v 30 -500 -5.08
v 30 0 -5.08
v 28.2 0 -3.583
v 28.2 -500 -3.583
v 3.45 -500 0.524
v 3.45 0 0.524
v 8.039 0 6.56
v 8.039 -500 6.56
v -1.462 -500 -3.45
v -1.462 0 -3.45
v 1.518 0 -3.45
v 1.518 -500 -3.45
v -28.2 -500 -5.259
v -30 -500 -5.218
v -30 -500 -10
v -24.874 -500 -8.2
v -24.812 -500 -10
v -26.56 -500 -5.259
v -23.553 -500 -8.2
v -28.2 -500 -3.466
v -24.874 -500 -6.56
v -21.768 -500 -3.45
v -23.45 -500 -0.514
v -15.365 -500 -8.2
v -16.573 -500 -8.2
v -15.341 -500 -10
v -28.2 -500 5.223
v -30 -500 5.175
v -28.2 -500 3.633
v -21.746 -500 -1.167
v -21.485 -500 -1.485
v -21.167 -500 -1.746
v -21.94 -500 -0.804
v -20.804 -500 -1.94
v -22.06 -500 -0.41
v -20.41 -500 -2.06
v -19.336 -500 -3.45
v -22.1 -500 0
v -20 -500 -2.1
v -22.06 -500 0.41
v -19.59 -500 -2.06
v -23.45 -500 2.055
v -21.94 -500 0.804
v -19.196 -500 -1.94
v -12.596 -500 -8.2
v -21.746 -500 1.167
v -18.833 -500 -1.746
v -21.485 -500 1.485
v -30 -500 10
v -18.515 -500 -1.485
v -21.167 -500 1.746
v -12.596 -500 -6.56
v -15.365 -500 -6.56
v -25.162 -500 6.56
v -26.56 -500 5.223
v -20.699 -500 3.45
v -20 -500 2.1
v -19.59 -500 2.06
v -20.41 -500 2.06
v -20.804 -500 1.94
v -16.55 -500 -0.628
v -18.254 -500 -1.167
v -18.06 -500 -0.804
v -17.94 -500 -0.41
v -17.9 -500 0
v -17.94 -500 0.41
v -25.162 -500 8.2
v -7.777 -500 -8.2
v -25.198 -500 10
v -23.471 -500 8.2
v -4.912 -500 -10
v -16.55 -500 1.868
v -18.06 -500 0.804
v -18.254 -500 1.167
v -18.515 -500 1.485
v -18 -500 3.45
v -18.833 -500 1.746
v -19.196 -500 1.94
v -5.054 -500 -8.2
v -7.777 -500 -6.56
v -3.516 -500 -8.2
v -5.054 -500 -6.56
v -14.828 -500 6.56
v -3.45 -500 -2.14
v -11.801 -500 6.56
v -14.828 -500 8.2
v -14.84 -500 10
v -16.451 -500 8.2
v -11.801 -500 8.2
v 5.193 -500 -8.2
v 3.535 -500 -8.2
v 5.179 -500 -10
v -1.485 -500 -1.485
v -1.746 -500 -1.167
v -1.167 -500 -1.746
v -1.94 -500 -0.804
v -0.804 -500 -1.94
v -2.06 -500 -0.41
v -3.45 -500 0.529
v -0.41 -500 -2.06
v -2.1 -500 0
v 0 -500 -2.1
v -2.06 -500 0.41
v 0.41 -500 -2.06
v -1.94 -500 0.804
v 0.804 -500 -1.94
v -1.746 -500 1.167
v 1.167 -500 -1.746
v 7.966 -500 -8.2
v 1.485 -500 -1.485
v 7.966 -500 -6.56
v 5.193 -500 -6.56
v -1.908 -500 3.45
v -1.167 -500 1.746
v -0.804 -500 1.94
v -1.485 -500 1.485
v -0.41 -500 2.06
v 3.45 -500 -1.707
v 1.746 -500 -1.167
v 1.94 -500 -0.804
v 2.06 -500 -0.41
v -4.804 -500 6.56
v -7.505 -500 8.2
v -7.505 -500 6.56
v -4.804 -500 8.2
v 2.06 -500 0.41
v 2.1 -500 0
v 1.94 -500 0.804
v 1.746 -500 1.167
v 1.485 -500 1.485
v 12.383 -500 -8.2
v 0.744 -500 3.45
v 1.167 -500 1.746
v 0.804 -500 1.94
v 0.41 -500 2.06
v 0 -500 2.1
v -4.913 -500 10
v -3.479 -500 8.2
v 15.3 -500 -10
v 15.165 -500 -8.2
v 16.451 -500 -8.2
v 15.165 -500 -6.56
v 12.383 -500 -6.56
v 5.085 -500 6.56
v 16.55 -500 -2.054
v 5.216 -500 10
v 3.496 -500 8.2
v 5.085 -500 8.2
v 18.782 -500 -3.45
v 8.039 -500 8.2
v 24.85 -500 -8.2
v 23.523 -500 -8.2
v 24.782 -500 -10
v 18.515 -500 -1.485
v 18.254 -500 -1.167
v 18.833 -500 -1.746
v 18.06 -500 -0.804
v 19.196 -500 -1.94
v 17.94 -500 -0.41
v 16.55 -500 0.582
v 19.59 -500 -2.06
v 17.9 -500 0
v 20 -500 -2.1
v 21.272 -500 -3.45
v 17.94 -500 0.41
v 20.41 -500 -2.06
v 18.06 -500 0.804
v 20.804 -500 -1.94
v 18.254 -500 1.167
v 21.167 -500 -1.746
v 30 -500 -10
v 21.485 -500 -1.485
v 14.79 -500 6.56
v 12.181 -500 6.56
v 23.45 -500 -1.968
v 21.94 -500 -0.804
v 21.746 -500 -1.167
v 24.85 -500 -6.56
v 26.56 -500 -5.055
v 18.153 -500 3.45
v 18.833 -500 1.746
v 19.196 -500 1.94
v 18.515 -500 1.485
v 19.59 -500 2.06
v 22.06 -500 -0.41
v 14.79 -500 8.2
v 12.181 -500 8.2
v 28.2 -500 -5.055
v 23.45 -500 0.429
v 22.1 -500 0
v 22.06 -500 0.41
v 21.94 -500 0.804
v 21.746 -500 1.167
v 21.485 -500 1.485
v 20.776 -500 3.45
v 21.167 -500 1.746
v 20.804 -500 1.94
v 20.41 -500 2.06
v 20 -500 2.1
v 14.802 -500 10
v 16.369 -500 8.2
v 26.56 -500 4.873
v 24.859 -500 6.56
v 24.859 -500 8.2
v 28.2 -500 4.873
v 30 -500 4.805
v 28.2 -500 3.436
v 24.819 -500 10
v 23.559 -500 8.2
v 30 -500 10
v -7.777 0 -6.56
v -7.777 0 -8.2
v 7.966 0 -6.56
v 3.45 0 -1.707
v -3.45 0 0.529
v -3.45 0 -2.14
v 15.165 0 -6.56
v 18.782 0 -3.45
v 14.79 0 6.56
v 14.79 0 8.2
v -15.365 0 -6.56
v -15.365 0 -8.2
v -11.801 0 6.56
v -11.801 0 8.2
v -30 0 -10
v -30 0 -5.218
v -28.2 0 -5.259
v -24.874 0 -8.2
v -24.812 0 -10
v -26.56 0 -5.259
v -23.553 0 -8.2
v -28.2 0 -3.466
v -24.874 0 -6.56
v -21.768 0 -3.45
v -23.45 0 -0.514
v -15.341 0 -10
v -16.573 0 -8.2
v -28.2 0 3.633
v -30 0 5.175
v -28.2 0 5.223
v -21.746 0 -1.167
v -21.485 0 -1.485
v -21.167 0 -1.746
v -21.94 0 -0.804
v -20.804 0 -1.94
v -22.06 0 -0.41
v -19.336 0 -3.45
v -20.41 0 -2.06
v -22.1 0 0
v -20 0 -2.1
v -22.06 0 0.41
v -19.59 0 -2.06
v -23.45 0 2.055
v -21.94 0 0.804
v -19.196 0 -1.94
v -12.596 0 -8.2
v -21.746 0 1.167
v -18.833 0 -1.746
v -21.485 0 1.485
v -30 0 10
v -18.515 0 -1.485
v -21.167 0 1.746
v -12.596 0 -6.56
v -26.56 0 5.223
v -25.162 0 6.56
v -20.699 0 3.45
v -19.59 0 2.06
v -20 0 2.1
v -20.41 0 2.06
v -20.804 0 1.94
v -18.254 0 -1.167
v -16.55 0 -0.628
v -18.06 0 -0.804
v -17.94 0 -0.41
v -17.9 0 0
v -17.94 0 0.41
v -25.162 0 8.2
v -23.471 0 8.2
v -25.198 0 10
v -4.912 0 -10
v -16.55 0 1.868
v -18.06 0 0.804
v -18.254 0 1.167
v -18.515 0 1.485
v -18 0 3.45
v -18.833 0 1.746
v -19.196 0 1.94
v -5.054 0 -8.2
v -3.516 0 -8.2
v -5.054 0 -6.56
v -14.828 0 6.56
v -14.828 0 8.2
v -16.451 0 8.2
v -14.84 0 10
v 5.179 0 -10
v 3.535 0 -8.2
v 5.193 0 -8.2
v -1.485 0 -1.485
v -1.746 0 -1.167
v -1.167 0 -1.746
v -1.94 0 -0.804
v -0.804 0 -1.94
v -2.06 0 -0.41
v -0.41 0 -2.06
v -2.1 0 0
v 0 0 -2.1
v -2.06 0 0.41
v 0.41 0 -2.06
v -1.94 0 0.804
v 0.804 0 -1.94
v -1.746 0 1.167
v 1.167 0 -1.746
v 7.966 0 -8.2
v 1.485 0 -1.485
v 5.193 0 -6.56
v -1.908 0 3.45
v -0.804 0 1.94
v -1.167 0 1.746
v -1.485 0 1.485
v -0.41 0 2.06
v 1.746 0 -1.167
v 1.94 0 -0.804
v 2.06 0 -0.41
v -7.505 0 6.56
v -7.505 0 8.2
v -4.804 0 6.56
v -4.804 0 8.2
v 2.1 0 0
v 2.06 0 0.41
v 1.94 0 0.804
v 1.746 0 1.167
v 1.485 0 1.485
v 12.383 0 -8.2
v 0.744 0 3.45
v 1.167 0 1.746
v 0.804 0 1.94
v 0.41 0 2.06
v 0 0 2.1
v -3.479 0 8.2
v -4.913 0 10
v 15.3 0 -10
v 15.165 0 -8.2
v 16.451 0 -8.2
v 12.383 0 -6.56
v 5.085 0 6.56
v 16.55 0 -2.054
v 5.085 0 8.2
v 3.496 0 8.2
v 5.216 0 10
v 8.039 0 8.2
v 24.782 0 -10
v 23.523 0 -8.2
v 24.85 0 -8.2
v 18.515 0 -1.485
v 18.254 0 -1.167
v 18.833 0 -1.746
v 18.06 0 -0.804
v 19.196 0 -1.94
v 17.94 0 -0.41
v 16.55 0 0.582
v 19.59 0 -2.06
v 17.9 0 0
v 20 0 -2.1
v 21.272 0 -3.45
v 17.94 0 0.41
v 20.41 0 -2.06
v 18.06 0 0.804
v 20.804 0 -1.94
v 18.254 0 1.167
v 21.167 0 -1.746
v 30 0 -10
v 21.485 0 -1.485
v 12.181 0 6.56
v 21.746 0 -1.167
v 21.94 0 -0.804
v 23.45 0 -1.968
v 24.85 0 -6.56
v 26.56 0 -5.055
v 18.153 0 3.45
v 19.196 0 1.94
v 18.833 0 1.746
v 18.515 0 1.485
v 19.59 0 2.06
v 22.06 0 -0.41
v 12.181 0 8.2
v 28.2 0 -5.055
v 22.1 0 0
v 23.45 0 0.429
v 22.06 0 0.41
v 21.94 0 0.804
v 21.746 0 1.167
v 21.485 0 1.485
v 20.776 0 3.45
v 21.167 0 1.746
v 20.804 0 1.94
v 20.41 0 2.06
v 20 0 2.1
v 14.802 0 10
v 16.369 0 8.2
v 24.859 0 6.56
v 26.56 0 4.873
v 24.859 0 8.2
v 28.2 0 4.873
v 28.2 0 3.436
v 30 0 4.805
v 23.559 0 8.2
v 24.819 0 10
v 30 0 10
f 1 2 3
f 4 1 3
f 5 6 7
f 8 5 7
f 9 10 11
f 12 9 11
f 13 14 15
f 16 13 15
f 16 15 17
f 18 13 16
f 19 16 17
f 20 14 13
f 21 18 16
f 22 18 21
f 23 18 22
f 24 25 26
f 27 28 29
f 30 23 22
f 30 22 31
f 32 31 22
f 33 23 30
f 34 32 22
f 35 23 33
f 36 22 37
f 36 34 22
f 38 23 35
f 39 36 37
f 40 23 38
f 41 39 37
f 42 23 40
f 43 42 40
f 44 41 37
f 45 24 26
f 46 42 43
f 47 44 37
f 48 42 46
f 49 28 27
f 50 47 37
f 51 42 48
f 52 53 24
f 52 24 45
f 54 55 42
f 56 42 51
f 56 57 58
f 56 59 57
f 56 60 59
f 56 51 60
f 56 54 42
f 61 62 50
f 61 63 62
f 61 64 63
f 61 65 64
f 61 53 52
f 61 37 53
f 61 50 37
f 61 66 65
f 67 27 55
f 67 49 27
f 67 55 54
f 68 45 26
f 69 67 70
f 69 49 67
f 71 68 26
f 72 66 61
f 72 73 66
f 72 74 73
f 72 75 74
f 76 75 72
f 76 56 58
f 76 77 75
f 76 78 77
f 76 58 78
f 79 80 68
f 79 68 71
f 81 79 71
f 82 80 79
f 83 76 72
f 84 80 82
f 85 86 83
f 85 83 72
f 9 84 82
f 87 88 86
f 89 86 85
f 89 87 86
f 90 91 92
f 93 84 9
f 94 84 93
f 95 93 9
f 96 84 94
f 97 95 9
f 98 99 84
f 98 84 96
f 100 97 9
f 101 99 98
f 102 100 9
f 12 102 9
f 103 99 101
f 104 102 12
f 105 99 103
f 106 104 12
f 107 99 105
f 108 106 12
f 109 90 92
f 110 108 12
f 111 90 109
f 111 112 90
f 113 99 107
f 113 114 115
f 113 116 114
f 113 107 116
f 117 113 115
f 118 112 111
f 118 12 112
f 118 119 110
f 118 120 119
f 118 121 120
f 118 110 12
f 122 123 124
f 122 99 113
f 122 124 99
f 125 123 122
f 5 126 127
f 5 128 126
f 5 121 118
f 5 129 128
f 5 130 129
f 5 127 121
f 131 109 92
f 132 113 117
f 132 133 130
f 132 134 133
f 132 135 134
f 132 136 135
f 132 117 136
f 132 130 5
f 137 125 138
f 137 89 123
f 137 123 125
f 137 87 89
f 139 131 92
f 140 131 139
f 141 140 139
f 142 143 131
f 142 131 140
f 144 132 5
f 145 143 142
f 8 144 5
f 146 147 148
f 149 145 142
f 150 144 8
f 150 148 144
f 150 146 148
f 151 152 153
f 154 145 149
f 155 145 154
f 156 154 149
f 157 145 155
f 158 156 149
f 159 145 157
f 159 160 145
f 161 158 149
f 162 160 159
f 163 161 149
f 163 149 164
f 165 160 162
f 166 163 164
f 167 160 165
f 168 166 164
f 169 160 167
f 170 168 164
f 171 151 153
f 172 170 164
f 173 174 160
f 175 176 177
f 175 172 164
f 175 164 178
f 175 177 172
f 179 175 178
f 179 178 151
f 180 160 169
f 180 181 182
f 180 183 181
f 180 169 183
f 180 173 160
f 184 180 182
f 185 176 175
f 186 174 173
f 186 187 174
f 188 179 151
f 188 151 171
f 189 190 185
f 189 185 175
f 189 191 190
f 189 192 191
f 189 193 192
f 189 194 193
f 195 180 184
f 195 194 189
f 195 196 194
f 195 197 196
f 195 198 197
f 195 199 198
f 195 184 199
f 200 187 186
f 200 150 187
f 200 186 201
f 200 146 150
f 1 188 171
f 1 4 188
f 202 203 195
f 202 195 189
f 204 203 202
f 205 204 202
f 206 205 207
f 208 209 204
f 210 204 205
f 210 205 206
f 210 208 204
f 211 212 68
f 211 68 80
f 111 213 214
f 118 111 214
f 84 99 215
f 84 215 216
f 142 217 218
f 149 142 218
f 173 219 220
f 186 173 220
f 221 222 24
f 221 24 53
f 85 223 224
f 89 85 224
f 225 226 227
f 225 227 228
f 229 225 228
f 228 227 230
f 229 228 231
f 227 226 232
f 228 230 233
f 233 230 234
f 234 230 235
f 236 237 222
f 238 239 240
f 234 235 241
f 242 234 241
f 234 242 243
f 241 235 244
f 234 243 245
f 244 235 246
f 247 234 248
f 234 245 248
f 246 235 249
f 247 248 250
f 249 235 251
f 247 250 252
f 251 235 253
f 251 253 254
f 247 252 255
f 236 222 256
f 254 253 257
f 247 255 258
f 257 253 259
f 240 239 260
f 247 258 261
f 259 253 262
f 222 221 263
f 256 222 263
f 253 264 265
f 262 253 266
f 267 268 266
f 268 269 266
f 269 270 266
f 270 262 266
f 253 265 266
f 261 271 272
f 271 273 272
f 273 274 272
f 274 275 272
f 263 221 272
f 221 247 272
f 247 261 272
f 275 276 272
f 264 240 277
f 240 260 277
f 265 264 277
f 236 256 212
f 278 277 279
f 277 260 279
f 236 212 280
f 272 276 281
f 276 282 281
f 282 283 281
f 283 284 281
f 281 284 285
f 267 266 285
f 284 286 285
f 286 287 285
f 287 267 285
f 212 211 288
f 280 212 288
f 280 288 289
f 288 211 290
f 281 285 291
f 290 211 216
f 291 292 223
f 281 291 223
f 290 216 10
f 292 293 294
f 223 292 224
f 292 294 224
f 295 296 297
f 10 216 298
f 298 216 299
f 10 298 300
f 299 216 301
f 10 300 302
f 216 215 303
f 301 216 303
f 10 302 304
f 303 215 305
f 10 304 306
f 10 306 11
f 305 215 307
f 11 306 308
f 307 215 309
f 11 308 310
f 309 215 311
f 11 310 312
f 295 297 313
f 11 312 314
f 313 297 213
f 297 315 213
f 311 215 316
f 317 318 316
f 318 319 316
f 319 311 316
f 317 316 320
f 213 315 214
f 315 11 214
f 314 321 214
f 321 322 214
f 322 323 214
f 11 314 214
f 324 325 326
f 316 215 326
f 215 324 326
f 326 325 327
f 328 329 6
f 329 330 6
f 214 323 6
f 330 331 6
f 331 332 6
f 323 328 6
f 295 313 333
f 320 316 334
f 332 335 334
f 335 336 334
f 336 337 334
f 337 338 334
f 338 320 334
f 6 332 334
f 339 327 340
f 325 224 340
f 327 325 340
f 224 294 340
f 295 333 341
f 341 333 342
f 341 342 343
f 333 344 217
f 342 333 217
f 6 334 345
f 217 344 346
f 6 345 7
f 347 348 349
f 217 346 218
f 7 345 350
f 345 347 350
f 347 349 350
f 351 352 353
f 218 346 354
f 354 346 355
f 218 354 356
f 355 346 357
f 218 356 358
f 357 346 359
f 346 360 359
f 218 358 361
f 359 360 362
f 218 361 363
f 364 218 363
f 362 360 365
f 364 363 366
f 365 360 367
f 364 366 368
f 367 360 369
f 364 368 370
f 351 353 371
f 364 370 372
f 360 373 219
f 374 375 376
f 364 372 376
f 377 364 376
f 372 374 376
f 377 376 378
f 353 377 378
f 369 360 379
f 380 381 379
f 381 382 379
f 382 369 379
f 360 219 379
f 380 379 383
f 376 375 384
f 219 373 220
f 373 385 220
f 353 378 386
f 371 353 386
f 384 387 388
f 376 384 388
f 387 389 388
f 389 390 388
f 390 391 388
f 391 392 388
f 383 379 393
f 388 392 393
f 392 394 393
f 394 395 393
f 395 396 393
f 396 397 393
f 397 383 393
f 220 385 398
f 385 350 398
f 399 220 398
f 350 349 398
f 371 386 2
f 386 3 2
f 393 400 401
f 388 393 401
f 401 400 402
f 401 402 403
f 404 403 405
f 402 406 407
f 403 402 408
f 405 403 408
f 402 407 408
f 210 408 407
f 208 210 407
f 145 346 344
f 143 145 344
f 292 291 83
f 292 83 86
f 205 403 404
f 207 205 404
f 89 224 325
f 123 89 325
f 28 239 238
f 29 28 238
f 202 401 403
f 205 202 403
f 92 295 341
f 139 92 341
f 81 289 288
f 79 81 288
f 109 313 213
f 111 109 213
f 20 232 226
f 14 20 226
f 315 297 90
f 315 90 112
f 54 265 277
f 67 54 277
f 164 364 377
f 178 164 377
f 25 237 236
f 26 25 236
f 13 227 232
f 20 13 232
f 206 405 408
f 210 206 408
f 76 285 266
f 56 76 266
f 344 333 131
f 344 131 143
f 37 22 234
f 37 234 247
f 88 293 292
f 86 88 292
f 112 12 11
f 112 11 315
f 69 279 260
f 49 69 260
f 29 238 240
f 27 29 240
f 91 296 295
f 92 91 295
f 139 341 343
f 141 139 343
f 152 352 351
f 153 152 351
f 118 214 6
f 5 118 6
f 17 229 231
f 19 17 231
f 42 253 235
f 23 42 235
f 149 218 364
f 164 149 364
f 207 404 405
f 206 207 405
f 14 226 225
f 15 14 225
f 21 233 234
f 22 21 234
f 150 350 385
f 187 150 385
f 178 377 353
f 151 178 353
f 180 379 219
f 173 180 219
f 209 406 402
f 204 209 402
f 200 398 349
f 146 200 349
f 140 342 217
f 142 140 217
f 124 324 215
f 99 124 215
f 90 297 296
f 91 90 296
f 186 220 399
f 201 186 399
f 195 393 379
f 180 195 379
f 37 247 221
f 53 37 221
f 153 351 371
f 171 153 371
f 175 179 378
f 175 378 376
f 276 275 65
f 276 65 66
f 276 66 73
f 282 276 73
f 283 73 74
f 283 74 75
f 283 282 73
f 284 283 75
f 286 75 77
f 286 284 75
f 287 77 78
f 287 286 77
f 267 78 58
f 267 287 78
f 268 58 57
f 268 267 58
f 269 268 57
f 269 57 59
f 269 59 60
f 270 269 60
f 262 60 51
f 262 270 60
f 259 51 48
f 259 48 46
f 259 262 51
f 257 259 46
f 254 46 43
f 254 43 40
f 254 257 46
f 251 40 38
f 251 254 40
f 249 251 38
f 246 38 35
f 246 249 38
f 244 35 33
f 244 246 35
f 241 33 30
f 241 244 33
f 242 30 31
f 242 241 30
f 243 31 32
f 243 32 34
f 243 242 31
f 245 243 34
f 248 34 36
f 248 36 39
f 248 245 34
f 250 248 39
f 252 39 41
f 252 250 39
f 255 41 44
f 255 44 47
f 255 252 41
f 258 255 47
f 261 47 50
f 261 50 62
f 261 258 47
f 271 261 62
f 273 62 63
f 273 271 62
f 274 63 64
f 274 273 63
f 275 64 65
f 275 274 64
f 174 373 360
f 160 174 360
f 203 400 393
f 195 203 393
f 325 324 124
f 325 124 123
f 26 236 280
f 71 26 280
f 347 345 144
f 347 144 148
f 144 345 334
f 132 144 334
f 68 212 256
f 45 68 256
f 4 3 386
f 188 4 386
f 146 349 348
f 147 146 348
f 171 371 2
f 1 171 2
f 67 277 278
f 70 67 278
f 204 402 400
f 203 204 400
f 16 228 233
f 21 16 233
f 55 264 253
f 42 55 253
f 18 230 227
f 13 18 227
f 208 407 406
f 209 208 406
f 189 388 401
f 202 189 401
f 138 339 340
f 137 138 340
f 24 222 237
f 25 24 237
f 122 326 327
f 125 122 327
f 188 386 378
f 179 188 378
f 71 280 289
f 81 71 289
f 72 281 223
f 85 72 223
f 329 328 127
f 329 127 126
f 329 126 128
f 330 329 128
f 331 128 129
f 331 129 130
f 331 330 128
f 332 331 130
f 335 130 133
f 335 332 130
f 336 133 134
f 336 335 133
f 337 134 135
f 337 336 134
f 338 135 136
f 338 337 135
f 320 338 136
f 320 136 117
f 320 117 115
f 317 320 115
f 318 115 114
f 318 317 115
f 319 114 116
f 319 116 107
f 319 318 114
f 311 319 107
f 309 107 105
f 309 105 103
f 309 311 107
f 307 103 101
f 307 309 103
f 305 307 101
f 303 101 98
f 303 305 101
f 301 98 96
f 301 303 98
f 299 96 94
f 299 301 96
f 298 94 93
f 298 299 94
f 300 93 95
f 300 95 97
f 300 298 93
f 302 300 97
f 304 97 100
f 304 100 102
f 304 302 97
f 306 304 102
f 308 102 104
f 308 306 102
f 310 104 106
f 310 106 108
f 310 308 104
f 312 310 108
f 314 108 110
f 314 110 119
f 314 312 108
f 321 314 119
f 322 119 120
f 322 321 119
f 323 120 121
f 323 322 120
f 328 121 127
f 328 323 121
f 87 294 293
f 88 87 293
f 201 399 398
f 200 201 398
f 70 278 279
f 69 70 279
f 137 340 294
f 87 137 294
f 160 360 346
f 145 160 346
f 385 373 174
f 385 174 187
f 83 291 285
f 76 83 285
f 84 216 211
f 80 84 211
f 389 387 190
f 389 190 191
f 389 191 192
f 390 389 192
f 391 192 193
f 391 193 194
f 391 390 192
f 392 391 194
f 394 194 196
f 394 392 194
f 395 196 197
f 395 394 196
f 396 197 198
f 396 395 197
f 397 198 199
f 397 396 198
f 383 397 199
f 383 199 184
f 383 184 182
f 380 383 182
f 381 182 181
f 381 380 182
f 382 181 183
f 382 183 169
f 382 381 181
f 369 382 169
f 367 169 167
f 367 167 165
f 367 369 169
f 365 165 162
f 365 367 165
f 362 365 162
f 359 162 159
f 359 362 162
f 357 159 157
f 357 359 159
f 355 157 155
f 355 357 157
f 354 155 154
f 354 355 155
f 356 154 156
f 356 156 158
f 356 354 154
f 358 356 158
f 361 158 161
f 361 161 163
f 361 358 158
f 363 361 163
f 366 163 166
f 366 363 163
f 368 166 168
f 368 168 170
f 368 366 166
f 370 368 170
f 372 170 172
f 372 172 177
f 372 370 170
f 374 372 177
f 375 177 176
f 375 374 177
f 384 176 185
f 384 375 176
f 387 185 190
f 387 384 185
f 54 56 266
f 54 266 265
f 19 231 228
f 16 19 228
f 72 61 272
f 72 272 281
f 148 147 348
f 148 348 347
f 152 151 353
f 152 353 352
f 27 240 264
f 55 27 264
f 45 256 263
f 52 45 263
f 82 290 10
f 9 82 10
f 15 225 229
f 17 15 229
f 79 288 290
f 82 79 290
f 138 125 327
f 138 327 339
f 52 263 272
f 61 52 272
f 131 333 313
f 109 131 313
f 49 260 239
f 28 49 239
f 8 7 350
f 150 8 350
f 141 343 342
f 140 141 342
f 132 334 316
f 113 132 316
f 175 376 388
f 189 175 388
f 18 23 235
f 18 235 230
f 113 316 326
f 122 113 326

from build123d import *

# Parameters (mm, degrees)
F0_R     = 2.1
F0_W     = 2.608595
F0_H     = 1.64
F0_W_2   = 2.954579
F0_W_3   = 2.781998
F0_W_4   = 2.772428
F0_W_5   = 2.700623
F0_W_6   = 3.026465
F0_W_7   = 2.722846
F0_W_8   = 2.768436
F1_DEPTH = 500


with BuildPart() as f1:
    # F0 (on Front) → F1 (new body)
    with BuildSketch(Plane.XZ):
        Polygon((30, 4.805219), (30, 10), (24.818853, 10), (23.559123, 8.2), (24.85866, 8.2), (28.2, 8.2), (28.2, 4.872657), (28.2, 3.4364), align=None)
        Polygon((28.2, 8.2), (24.85866, 8.2), (24.85866, 6.56), (26.56, 6.56), (26.56, 4.872657), (28.2, 4.872657), align=None)
        Polygon((26.56, 6.56), (24.85866, 6.56), (20.776314, 3.45), (23.45, 3.45), (23.45, 0.429287), (26.56, 4.872657), align=None)
        Polygon((28.2, -5.054571), (26.56, -5.054571), (26.56, -6.56), (24.849551, -6.56), (24.849551, -8.2), (28.2, -8.2), align=None)
        Polygon((28.2, -3.583251), (28.2, -5.054571), (28.2, -8.2), (24.849551, -8.2), (23.522707, -8.2), (24.78151, -10), (30, -10), (30, -5.079649), align=None)
        Polygon((26.56, -5.054571), (23.45, -1.968018), (23.45, -3.45), (21.271573, -3.45), (24.849551, -6.56), (26.56, -6.56), align=None)
        Polygon((23.45, 3.45), (20.776314, 3.45), (18.152582, 3.45), (16.55, 3.45), (16.55, 0.581537), (16.55, -2.054411), (16.55, -3.45), (18.781548, -3.45), (21.271573, -3.45), (23.45, -3.45), (23.45, -1.968018), (23.45, 0.429287), align=None)
        with Locations((20, 0)):
            Circle(F0_R, mode=Mode.SUBTRACT)
        Polygon((16.55, 3.45), (18.152582, 3.45), (14.789955, 6.56), (12.18136, 6.56), (16.55, 0.581537), align=None)
        with Locations((13.485657, 7.38)):
            Rectangle(F0_W, F0_H)
        Polygon((12.18136, 8.2), (14.789955, 8.2), (16.369443, 8.2), (14.802462, 10), (5.216223, 10), (3.495616, 8.2), (5.084707, 8.2), (8.039286, 8.2), align=None)
        with Locations((6.561996, 7.38)):
            Rectangle(F0_W_2, F0_H)
        Polygon((3.45, 0.523604), (8.039286, 6.56), (5.084707, 6.56), (0.743741, 3.45), (3.45, 3.45), align=None)
        Polygon((16.55, -3.45), (16.55, -2.054411), (12.382907, -6.56), (15.164905, -6.56), (18.781548, -3.45), align=None)
        with Locations((13.773906, -7.38)):
            Rectangle(F0_W_3, F0_H)
        Polygon((15.164905, -8.2), (12.382907, -8.2), (7.965668, -8.2), (5.19324, -8.2), (3.534545, -8.2), (5.178779, -10), (15.299954, -10), (16.450917, -8.2), align=None)
        with Locations((6.579454, -7.38)):
            Rectangle(F0_W_4, F0_H)
        Polygon((5.19324, -6.56), (7.965668, -6.56), (3.45, -1.706813), (3.45, -3.45), (1.51754, -3.45), align=None)
        Polygon((3.45, -1.706813), (3.45, 0.523604), (3.45, 3.45), (0.743741, 3.45), (-1.908073, 3.45), (-3.45, 3.45), (-3.45, 0.529449), (-3.45, -2.140485), (-3.45, -3.45), (-1.461518, -3.45), (1.51754, -3.45), (3.45, -3.45), align=None)
        Circle(F0_R, mode=Mode.SUBTRACT)
        Polygon((-3.45, 3.45), (-1.908073, 3.45), (-4.804165, 6.56), (-7.504788, 6.56), (-3.45, 0.529449), align=None)
        with Locations((-6.154476, 7.38)):
            Rectangle(F0_W_5, F0_H)
        Polygon((-7.504788, 8.2), (-4.804165, 8.2), (-3.478876, 8.2), (-4.912788, 10), (-14.839575, 10), (-16.450822, 8.2), (-14.827697, 8.2), (-11.801232, 8.2), align=None)
        with Locations((-13.314464, 7.38)):
            Rectangle(F0_W_6, F0_H)
        Polygon((-16.55, 1.867669), (-11.801232, 6.56), (-14.827697, 6.56), (-17.999909, 3.45), (-16.55, 3.45), align=None)
        Polygon((-5.053682, -6.56), (-1.461518, -3.45), (-3.45, -3.45), (-3.45, -2.140485), (-7.776528, -6.56), align=None)
        with Locations((-6.415105, -7.38)):
            Rectangle(F0_W_7, F0_H)
        Polygon((-3.516317, -8.2), (-5.053682, -8.2), (-7.776528, -8.2), (-12.596157, -8.2), (-15.364593, -8.2), (-16.573226, -8.2), (-15.341443, -10), (-4.912339, -10), align=None)
        with Locations((-13.980375, -7.38)):
            Rectangle(F0_W_8, F0_H)
        Polygon((-15.364593, -6.56), (-12.596157, -6.56), (-16.55, -0.627868), (-16.55, -3.45), (-19.336489, -3.45), align=None)
        Polygon((-16.55, -0.627868), (-16.55, 1.867669), (-16.55, 3.45), (-17.999909, 3.45), (-20.69855, 3.45), (-23.45, 3.45), (-23.45, 2.055018), (-23.45, -0.513568), (-23.45, -3.45), (-21.768495, -3.45), (-19.336489, -3.45), (-16.55, -3.45), align=None)
        with Locations((-20, 0)):
            Circle(F0_R, mode=Mode.SUBTRACT)
        Polygon((-23.45, 3.45), (-20.69855, 3.45), (-25.162122, 6.56), (-26.56, 6.56), (-26.56, 5.223384), (-23.45, 2.055018), align=None)
        Polygon((-24.874446, -6.56), (-21.768495, -3.45), (-23.45, -3.45), (-23.45, -0.513568), (-26.56, -5.258857), (-26.56, -6.56), align=None)
        Polygon((-26.56, 6.56), (-25.162122, 6.56), (-25.162122, 8.2), (-28.2, 8.2), (-28.2, 5.223384), (-26.56, 5.223384), align=None)
        Polygon((-28.2, 8.2), (-25.162122, 8.2), (-23.471262, 8.2), (-25.197601, 10), (-30, 10), (-30, 5.174848), (-28.2, 3.632653), (-28.2, 5.223384), align=None)
        Polygon((-24.874446, -8.2), (-24.874446, -6.56), (-26.56, -6.56), (-26.56, -5.258857), (-28.2, -5.258857), (-28.2, -8.2), align=None)
        Polygon((-23.553334, -8.2), (-24.874446, -8.2), (-28.2, -8.2), (-28.2, -5.258857), (-28.2, -3.466297), (-30, -5.218167), (-30, -10), (-24.812492, -10), align=None)
    extrude(amount=F1_DEPTH)


solid = f1.part
